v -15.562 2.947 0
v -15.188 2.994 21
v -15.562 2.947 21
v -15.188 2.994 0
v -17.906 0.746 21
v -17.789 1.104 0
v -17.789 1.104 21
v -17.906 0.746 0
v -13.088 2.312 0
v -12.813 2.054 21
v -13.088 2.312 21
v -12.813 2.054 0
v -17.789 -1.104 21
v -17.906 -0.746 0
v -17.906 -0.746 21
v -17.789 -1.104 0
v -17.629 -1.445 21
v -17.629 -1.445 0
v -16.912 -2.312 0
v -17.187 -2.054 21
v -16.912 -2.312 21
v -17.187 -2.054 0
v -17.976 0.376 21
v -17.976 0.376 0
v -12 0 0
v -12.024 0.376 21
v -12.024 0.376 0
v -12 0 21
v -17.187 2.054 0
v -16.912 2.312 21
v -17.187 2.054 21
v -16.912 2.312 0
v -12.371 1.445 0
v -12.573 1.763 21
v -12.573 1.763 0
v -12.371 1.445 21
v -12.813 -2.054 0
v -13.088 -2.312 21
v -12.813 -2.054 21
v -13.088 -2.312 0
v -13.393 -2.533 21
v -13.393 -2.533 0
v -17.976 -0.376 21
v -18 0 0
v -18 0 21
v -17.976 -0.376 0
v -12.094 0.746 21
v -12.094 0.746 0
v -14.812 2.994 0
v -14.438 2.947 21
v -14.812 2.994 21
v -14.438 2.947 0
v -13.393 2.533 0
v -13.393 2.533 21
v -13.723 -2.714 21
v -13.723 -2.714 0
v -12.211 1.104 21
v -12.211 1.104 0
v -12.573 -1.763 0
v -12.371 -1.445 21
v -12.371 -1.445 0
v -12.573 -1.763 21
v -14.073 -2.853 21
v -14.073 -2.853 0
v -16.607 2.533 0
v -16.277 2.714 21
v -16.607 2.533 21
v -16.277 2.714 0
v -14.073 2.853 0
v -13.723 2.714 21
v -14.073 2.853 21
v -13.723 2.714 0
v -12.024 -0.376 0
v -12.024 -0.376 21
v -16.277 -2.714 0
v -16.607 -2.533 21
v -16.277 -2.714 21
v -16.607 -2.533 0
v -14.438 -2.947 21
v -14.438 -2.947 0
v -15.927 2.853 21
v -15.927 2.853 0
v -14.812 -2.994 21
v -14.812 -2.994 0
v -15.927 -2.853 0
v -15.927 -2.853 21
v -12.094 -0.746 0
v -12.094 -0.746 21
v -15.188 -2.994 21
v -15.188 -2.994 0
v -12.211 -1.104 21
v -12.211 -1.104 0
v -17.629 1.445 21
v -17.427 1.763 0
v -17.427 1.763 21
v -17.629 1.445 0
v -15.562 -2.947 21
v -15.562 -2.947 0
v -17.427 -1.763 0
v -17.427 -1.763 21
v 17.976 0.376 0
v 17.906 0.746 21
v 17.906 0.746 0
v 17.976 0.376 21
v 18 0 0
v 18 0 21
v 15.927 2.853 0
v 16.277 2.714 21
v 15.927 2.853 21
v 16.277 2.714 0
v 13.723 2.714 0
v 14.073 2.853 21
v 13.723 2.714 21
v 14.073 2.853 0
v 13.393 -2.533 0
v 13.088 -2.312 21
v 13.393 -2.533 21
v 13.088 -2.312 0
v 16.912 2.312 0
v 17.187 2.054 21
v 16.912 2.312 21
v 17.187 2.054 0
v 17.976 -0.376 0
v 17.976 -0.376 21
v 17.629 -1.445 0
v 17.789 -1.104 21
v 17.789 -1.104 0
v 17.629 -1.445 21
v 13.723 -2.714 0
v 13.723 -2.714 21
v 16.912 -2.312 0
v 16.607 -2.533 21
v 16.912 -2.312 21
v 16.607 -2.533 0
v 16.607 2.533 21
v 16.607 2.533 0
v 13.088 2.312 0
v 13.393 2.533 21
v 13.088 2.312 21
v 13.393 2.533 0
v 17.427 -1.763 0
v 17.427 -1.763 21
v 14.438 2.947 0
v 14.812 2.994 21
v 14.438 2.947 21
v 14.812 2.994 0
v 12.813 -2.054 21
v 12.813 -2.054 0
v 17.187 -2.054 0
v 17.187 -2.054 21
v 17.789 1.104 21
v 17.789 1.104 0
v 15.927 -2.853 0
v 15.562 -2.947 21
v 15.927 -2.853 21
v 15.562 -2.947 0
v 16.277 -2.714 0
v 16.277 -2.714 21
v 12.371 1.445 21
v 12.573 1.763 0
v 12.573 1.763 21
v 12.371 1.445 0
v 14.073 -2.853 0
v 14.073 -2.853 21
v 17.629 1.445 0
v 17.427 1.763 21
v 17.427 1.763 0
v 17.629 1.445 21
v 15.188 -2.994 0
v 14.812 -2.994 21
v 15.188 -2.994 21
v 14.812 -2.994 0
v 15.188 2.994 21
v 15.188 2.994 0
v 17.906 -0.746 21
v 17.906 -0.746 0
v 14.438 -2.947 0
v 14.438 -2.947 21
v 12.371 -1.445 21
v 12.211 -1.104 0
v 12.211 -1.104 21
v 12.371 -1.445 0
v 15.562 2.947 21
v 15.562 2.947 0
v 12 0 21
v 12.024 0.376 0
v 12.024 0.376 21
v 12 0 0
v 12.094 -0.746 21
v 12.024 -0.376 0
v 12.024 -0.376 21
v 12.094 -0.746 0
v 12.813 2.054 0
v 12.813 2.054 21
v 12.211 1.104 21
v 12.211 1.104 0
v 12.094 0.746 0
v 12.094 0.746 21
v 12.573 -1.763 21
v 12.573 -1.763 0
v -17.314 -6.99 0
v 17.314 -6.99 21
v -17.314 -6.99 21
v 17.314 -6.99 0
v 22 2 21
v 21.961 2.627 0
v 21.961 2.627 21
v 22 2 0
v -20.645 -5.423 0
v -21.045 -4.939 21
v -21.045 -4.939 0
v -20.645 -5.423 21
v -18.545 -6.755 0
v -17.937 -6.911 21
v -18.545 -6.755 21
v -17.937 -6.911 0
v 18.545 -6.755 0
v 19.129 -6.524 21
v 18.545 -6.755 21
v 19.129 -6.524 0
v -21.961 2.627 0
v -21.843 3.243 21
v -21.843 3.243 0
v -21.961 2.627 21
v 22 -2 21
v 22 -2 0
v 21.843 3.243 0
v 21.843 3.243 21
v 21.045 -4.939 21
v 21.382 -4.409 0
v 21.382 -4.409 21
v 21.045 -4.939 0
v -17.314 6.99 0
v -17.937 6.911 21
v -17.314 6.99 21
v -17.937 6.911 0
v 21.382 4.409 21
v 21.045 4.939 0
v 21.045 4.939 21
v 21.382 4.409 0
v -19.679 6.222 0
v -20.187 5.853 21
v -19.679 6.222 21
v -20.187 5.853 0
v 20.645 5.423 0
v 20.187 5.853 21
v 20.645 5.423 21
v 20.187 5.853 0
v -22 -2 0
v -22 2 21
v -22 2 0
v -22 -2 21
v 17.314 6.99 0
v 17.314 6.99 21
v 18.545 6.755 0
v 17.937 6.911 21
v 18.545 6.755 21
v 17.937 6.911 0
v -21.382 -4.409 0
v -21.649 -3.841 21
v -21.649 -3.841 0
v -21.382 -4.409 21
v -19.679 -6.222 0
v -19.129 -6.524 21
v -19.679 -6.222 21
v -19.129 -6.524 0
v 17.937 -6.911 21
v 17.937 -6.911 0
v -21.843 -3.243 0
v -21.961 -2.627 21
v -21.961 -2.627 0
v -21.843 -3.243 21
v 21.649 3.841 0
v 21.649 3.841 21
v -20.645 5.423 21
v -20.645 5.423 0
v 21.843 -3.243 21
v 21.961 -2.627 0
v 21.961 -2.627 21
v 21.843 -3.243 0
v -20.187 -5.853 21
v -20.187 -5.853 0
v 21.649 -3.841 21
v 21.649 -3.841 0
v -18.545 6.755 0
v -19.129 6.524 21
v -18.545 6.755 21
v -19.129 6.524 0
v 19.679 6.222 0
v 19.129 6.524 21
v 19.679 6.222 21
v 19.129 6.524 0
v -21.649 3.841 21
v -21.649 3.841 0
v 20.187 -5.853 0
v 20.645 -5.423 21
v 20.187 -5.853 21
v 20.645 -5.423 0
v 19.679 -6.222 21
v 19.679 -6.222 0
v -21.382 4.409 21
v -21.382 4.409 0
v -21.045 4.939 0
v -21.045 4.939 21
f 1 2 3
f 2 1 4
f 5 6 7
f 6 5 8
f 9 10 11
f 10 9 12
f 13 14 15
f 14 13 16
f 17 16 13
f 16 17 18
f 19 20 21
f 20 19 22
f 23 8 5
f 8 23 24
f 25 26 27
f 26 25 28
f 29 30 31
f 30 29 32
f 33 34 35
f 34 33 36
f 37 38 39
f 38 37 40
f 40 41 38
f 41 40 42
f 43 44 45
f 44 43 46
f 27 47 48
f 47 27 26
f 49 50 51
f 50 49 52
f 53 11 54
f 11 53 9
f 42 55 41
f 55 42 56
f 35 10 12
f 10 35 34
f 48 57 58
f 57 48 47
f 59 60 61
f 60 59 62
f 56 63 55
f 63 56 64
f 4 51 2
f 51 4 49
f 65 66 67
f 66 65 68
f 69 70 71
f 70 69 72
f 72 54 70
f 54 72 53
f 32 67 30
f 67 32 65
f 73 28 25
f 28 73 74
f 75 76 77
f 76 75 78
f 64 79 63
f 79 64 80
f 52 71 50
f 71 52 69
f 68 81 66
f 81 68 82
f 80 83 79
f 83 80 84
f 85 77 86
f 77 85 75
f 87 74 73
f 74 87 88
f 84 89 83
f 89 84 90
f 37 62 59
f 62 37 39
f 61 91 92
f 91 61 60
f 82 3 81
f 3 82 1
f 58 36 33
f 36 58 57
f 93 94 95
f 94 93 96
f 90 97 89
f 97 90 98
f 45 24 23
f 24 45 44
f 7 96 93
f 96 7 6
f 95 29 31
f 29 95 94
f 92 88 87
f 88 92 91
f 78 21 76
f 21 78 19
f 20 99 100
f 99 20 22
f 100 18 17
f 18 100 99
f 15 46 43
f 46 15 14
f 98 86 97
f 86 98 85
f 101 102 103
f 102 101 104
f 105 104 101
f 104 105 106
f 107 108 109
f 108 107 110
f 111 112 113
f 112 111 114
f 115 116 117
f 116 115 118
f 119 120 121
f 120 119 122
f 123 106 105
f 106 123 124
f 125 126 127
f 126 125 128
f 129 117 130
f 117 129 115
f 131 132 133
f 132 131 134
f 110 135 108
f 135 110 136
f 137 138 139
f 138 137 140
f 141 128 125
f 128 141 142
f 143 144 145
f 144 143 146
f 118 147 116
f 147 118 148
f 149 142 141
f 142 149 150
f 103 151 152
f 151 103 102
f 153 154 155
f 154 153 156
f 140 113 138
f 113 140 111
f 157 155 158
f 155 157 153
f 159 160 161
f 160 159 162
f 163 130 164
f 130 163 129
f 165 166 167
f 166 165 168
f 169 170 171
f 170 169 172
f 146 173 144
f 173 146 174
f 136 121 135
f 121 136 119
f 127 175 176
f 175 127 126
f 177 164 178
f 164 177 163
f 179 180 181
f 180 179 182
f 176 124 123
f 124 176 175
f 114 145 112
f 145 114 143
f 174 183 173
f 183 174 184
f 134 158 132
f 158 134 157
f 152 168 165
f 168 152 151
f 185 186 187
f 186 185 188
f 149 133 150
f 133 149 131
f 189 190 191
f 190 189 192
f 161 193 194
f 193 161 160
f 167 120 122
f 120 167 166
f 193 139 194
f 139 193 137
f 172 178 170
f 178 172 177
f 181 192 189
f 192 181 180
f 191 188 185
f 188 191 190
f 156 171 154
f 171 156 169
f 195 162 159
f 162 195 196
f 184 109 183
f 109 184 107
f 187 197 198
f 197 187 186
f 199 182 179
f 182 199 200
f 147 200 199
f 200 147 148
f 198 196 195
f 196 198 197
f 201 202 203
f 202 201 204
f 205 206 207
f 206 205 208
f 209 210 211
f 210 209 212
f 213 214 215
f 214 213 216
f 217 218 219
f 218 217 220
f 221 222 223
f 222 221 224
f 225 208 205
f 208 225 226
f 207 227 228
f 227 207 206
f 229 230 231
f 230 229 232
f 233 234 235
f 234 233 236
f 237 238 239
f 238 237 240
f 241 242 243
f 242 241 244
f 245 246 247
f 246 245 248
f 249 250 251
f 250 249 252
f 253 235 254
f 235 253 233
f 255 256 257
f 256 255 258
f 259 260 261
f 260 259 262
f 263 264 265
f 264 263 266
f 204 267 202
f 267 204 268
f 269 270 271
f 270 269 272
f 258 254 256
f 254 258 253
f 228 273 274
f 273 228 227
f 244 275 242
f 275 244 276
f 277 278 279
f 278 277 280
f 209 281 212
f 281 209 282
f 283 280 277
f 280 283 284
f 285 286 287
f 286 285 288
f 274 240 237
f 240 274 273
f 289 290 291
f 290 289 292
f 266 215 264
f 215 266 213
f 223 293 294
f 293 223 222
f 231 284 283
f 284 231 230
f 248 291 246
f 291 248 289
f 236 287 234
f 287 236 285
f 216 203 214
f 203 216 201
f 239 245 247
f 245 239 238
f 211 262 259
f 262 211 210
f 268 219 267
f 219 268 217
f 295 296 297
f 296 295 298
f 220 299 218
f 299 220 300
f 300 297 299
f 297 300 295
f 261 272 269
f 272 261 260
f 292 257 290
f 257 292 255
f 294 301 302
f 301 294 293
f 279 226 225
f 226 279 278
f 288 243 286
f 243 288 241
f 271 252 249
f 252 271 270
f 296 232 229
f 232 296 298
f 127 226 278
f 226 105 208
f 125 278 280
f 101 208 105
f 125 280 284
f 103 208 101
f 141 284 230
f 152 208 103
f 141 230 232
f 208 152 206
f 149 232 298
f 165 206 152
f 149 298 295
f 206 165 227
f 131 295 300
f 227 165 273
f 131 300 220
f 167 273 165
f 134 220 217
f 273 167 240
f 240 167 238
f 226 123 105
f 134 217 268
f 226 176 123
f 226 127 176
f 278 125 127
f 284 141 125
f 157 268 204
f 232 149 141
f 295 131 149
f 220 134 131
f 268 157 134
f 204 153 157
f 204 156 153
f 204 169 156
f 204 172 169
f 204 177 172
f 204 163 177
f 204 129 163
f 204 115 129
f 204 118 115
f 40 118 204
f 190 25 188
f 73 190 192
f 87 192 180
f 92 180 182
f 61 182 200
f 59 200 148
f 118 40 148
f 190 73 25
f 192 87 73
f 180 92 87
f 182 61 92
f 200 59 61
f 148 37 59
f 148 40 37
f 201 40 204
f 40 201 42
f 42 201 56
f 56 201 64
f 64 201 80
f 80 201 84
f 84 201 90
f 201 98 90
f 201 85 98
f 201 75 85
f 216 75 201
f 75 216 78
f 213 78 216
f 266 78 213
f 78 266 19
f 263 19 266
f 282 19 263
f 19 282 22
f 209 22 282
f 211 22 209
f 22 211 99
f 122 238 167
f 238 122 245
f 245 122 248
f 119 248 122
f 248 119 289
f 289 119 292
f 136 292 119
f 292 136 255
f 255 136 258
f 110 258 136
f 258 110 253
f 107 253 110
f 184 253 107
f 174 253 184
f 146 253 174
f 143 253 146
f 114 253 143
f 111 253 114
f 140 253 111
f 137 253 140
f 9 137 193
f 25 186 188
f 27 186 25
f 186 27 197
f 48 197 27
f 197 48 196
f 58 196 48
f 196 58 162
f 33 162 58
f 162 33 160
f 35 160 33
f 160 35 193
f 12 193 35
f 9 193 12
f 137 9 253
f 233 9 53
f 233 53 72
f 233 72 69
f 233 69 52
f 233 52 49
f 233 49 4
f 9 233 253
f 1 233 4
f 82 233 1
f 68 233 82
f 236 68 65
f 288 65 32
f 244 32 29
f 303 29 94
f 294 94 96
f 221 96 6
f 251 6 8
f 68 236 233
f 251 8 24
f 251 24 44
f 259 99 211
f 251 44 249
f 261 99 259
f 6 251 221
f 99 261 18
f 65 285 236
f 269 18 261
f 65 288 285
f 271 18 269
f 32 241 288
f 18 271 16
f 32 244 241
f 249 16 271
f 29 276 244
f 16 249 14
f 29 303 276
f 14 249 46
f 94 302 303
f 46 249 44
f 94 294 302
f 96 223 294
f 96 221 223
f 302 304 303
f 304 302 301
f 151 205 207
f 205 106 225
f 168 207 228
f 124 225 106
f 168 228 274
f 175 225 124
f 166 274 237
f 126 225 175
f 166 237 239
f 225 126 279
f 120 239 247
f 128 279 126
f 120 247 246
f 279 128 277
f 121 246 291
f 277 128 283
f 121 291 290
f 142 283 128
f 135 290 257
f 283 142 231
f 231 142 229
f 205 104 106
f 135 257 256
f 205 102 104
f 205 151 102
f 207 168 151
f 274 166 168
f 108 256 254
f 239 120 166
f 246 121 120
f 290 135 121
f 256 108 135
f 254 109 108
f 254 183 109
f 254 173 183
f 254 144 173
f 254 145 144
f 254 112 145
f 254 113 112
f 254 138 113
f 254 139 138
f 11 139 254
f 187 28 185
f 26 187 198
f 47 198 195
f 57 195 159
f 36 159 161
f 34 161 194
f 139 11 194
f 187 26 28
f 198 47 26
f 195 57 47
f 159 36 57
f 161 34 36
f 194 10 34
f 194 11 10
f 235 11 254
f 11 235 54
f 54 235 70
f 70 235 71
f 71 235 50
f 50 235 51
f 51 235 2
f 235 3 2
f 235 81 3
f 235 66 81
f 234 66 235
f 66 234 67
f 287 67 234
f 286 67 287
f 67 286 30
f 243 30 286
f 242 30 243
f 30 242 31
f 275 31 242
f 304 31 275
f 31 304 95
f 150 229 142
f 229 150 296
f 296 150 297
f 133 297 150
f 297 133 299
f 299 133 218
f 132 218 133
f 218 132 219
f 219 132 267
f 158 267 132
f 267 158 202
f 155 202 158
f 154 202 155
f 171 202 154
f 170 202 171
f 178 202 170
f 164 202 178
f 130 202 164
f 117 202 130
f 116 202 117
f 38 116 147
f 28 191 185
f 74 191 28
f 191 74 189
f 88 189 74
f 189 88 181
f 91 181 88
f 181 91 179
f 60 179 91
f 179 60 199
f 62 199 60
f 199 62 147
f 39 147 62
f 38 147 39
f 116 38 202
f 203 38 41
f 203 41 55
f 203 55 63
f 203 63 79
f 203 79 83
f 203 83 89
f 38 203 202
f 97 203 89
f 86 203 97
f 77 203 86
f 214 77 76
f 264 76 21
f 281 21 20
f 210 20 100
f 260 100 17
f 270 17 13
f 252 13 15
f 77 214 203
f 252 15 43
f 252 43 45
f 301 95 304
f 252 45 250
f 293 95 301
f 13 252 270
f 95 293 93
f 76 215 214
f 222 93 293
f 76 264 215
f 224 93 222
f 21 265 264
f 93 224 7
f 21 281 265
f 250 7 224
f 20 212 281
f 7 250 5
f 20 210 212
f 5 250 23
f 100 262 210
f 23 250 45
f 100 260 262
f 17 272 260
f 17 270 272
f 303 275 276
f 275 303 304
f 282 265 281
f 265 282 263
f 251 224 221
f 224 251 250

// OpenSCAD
$fn = 50;


difference() {
	union() {
		hull() {
			translate(v = [-17.0000000000, 2.0000000000, 0]) {
				cylinder(h = 21, r = 5);
			}
			translate(v = [17.0000000000, 2.0000000000, 0]) {
				cylinder(h = 21, r = 5);
			}
			translate(v = [-17.0000000000, -2.0000000000, 0]) {
				cylinder(h = 21, r = 5);
			}
			translate(v = [17.0000000000, -2.0000000000, 0]) {
				cylinder(h = 21, r = 5);
			}
		}
	}
	union() {
		translate(v = [-15.0000000000, 0.0000000000, -100.0000000000]) {
			cylinder(h = 200, r = 3.0000000000);
		}
		translate(v = [-15.0000000000, 0.0000000000, -100.0000000000]) {
			cylinder(h = 200, r = 3.0000000000);
		}
		translate(v = [15.0000000000, 0.0000000000, -100.0000000000]) {
			cylinder(h = 200, r = 3.0000000000);
		}
		translate(v = [15.0000000000, 0.0000000000, -100.0000000000]) {
			cylinder(h = 200, r = 3.0000000000);
		}
	}
}
